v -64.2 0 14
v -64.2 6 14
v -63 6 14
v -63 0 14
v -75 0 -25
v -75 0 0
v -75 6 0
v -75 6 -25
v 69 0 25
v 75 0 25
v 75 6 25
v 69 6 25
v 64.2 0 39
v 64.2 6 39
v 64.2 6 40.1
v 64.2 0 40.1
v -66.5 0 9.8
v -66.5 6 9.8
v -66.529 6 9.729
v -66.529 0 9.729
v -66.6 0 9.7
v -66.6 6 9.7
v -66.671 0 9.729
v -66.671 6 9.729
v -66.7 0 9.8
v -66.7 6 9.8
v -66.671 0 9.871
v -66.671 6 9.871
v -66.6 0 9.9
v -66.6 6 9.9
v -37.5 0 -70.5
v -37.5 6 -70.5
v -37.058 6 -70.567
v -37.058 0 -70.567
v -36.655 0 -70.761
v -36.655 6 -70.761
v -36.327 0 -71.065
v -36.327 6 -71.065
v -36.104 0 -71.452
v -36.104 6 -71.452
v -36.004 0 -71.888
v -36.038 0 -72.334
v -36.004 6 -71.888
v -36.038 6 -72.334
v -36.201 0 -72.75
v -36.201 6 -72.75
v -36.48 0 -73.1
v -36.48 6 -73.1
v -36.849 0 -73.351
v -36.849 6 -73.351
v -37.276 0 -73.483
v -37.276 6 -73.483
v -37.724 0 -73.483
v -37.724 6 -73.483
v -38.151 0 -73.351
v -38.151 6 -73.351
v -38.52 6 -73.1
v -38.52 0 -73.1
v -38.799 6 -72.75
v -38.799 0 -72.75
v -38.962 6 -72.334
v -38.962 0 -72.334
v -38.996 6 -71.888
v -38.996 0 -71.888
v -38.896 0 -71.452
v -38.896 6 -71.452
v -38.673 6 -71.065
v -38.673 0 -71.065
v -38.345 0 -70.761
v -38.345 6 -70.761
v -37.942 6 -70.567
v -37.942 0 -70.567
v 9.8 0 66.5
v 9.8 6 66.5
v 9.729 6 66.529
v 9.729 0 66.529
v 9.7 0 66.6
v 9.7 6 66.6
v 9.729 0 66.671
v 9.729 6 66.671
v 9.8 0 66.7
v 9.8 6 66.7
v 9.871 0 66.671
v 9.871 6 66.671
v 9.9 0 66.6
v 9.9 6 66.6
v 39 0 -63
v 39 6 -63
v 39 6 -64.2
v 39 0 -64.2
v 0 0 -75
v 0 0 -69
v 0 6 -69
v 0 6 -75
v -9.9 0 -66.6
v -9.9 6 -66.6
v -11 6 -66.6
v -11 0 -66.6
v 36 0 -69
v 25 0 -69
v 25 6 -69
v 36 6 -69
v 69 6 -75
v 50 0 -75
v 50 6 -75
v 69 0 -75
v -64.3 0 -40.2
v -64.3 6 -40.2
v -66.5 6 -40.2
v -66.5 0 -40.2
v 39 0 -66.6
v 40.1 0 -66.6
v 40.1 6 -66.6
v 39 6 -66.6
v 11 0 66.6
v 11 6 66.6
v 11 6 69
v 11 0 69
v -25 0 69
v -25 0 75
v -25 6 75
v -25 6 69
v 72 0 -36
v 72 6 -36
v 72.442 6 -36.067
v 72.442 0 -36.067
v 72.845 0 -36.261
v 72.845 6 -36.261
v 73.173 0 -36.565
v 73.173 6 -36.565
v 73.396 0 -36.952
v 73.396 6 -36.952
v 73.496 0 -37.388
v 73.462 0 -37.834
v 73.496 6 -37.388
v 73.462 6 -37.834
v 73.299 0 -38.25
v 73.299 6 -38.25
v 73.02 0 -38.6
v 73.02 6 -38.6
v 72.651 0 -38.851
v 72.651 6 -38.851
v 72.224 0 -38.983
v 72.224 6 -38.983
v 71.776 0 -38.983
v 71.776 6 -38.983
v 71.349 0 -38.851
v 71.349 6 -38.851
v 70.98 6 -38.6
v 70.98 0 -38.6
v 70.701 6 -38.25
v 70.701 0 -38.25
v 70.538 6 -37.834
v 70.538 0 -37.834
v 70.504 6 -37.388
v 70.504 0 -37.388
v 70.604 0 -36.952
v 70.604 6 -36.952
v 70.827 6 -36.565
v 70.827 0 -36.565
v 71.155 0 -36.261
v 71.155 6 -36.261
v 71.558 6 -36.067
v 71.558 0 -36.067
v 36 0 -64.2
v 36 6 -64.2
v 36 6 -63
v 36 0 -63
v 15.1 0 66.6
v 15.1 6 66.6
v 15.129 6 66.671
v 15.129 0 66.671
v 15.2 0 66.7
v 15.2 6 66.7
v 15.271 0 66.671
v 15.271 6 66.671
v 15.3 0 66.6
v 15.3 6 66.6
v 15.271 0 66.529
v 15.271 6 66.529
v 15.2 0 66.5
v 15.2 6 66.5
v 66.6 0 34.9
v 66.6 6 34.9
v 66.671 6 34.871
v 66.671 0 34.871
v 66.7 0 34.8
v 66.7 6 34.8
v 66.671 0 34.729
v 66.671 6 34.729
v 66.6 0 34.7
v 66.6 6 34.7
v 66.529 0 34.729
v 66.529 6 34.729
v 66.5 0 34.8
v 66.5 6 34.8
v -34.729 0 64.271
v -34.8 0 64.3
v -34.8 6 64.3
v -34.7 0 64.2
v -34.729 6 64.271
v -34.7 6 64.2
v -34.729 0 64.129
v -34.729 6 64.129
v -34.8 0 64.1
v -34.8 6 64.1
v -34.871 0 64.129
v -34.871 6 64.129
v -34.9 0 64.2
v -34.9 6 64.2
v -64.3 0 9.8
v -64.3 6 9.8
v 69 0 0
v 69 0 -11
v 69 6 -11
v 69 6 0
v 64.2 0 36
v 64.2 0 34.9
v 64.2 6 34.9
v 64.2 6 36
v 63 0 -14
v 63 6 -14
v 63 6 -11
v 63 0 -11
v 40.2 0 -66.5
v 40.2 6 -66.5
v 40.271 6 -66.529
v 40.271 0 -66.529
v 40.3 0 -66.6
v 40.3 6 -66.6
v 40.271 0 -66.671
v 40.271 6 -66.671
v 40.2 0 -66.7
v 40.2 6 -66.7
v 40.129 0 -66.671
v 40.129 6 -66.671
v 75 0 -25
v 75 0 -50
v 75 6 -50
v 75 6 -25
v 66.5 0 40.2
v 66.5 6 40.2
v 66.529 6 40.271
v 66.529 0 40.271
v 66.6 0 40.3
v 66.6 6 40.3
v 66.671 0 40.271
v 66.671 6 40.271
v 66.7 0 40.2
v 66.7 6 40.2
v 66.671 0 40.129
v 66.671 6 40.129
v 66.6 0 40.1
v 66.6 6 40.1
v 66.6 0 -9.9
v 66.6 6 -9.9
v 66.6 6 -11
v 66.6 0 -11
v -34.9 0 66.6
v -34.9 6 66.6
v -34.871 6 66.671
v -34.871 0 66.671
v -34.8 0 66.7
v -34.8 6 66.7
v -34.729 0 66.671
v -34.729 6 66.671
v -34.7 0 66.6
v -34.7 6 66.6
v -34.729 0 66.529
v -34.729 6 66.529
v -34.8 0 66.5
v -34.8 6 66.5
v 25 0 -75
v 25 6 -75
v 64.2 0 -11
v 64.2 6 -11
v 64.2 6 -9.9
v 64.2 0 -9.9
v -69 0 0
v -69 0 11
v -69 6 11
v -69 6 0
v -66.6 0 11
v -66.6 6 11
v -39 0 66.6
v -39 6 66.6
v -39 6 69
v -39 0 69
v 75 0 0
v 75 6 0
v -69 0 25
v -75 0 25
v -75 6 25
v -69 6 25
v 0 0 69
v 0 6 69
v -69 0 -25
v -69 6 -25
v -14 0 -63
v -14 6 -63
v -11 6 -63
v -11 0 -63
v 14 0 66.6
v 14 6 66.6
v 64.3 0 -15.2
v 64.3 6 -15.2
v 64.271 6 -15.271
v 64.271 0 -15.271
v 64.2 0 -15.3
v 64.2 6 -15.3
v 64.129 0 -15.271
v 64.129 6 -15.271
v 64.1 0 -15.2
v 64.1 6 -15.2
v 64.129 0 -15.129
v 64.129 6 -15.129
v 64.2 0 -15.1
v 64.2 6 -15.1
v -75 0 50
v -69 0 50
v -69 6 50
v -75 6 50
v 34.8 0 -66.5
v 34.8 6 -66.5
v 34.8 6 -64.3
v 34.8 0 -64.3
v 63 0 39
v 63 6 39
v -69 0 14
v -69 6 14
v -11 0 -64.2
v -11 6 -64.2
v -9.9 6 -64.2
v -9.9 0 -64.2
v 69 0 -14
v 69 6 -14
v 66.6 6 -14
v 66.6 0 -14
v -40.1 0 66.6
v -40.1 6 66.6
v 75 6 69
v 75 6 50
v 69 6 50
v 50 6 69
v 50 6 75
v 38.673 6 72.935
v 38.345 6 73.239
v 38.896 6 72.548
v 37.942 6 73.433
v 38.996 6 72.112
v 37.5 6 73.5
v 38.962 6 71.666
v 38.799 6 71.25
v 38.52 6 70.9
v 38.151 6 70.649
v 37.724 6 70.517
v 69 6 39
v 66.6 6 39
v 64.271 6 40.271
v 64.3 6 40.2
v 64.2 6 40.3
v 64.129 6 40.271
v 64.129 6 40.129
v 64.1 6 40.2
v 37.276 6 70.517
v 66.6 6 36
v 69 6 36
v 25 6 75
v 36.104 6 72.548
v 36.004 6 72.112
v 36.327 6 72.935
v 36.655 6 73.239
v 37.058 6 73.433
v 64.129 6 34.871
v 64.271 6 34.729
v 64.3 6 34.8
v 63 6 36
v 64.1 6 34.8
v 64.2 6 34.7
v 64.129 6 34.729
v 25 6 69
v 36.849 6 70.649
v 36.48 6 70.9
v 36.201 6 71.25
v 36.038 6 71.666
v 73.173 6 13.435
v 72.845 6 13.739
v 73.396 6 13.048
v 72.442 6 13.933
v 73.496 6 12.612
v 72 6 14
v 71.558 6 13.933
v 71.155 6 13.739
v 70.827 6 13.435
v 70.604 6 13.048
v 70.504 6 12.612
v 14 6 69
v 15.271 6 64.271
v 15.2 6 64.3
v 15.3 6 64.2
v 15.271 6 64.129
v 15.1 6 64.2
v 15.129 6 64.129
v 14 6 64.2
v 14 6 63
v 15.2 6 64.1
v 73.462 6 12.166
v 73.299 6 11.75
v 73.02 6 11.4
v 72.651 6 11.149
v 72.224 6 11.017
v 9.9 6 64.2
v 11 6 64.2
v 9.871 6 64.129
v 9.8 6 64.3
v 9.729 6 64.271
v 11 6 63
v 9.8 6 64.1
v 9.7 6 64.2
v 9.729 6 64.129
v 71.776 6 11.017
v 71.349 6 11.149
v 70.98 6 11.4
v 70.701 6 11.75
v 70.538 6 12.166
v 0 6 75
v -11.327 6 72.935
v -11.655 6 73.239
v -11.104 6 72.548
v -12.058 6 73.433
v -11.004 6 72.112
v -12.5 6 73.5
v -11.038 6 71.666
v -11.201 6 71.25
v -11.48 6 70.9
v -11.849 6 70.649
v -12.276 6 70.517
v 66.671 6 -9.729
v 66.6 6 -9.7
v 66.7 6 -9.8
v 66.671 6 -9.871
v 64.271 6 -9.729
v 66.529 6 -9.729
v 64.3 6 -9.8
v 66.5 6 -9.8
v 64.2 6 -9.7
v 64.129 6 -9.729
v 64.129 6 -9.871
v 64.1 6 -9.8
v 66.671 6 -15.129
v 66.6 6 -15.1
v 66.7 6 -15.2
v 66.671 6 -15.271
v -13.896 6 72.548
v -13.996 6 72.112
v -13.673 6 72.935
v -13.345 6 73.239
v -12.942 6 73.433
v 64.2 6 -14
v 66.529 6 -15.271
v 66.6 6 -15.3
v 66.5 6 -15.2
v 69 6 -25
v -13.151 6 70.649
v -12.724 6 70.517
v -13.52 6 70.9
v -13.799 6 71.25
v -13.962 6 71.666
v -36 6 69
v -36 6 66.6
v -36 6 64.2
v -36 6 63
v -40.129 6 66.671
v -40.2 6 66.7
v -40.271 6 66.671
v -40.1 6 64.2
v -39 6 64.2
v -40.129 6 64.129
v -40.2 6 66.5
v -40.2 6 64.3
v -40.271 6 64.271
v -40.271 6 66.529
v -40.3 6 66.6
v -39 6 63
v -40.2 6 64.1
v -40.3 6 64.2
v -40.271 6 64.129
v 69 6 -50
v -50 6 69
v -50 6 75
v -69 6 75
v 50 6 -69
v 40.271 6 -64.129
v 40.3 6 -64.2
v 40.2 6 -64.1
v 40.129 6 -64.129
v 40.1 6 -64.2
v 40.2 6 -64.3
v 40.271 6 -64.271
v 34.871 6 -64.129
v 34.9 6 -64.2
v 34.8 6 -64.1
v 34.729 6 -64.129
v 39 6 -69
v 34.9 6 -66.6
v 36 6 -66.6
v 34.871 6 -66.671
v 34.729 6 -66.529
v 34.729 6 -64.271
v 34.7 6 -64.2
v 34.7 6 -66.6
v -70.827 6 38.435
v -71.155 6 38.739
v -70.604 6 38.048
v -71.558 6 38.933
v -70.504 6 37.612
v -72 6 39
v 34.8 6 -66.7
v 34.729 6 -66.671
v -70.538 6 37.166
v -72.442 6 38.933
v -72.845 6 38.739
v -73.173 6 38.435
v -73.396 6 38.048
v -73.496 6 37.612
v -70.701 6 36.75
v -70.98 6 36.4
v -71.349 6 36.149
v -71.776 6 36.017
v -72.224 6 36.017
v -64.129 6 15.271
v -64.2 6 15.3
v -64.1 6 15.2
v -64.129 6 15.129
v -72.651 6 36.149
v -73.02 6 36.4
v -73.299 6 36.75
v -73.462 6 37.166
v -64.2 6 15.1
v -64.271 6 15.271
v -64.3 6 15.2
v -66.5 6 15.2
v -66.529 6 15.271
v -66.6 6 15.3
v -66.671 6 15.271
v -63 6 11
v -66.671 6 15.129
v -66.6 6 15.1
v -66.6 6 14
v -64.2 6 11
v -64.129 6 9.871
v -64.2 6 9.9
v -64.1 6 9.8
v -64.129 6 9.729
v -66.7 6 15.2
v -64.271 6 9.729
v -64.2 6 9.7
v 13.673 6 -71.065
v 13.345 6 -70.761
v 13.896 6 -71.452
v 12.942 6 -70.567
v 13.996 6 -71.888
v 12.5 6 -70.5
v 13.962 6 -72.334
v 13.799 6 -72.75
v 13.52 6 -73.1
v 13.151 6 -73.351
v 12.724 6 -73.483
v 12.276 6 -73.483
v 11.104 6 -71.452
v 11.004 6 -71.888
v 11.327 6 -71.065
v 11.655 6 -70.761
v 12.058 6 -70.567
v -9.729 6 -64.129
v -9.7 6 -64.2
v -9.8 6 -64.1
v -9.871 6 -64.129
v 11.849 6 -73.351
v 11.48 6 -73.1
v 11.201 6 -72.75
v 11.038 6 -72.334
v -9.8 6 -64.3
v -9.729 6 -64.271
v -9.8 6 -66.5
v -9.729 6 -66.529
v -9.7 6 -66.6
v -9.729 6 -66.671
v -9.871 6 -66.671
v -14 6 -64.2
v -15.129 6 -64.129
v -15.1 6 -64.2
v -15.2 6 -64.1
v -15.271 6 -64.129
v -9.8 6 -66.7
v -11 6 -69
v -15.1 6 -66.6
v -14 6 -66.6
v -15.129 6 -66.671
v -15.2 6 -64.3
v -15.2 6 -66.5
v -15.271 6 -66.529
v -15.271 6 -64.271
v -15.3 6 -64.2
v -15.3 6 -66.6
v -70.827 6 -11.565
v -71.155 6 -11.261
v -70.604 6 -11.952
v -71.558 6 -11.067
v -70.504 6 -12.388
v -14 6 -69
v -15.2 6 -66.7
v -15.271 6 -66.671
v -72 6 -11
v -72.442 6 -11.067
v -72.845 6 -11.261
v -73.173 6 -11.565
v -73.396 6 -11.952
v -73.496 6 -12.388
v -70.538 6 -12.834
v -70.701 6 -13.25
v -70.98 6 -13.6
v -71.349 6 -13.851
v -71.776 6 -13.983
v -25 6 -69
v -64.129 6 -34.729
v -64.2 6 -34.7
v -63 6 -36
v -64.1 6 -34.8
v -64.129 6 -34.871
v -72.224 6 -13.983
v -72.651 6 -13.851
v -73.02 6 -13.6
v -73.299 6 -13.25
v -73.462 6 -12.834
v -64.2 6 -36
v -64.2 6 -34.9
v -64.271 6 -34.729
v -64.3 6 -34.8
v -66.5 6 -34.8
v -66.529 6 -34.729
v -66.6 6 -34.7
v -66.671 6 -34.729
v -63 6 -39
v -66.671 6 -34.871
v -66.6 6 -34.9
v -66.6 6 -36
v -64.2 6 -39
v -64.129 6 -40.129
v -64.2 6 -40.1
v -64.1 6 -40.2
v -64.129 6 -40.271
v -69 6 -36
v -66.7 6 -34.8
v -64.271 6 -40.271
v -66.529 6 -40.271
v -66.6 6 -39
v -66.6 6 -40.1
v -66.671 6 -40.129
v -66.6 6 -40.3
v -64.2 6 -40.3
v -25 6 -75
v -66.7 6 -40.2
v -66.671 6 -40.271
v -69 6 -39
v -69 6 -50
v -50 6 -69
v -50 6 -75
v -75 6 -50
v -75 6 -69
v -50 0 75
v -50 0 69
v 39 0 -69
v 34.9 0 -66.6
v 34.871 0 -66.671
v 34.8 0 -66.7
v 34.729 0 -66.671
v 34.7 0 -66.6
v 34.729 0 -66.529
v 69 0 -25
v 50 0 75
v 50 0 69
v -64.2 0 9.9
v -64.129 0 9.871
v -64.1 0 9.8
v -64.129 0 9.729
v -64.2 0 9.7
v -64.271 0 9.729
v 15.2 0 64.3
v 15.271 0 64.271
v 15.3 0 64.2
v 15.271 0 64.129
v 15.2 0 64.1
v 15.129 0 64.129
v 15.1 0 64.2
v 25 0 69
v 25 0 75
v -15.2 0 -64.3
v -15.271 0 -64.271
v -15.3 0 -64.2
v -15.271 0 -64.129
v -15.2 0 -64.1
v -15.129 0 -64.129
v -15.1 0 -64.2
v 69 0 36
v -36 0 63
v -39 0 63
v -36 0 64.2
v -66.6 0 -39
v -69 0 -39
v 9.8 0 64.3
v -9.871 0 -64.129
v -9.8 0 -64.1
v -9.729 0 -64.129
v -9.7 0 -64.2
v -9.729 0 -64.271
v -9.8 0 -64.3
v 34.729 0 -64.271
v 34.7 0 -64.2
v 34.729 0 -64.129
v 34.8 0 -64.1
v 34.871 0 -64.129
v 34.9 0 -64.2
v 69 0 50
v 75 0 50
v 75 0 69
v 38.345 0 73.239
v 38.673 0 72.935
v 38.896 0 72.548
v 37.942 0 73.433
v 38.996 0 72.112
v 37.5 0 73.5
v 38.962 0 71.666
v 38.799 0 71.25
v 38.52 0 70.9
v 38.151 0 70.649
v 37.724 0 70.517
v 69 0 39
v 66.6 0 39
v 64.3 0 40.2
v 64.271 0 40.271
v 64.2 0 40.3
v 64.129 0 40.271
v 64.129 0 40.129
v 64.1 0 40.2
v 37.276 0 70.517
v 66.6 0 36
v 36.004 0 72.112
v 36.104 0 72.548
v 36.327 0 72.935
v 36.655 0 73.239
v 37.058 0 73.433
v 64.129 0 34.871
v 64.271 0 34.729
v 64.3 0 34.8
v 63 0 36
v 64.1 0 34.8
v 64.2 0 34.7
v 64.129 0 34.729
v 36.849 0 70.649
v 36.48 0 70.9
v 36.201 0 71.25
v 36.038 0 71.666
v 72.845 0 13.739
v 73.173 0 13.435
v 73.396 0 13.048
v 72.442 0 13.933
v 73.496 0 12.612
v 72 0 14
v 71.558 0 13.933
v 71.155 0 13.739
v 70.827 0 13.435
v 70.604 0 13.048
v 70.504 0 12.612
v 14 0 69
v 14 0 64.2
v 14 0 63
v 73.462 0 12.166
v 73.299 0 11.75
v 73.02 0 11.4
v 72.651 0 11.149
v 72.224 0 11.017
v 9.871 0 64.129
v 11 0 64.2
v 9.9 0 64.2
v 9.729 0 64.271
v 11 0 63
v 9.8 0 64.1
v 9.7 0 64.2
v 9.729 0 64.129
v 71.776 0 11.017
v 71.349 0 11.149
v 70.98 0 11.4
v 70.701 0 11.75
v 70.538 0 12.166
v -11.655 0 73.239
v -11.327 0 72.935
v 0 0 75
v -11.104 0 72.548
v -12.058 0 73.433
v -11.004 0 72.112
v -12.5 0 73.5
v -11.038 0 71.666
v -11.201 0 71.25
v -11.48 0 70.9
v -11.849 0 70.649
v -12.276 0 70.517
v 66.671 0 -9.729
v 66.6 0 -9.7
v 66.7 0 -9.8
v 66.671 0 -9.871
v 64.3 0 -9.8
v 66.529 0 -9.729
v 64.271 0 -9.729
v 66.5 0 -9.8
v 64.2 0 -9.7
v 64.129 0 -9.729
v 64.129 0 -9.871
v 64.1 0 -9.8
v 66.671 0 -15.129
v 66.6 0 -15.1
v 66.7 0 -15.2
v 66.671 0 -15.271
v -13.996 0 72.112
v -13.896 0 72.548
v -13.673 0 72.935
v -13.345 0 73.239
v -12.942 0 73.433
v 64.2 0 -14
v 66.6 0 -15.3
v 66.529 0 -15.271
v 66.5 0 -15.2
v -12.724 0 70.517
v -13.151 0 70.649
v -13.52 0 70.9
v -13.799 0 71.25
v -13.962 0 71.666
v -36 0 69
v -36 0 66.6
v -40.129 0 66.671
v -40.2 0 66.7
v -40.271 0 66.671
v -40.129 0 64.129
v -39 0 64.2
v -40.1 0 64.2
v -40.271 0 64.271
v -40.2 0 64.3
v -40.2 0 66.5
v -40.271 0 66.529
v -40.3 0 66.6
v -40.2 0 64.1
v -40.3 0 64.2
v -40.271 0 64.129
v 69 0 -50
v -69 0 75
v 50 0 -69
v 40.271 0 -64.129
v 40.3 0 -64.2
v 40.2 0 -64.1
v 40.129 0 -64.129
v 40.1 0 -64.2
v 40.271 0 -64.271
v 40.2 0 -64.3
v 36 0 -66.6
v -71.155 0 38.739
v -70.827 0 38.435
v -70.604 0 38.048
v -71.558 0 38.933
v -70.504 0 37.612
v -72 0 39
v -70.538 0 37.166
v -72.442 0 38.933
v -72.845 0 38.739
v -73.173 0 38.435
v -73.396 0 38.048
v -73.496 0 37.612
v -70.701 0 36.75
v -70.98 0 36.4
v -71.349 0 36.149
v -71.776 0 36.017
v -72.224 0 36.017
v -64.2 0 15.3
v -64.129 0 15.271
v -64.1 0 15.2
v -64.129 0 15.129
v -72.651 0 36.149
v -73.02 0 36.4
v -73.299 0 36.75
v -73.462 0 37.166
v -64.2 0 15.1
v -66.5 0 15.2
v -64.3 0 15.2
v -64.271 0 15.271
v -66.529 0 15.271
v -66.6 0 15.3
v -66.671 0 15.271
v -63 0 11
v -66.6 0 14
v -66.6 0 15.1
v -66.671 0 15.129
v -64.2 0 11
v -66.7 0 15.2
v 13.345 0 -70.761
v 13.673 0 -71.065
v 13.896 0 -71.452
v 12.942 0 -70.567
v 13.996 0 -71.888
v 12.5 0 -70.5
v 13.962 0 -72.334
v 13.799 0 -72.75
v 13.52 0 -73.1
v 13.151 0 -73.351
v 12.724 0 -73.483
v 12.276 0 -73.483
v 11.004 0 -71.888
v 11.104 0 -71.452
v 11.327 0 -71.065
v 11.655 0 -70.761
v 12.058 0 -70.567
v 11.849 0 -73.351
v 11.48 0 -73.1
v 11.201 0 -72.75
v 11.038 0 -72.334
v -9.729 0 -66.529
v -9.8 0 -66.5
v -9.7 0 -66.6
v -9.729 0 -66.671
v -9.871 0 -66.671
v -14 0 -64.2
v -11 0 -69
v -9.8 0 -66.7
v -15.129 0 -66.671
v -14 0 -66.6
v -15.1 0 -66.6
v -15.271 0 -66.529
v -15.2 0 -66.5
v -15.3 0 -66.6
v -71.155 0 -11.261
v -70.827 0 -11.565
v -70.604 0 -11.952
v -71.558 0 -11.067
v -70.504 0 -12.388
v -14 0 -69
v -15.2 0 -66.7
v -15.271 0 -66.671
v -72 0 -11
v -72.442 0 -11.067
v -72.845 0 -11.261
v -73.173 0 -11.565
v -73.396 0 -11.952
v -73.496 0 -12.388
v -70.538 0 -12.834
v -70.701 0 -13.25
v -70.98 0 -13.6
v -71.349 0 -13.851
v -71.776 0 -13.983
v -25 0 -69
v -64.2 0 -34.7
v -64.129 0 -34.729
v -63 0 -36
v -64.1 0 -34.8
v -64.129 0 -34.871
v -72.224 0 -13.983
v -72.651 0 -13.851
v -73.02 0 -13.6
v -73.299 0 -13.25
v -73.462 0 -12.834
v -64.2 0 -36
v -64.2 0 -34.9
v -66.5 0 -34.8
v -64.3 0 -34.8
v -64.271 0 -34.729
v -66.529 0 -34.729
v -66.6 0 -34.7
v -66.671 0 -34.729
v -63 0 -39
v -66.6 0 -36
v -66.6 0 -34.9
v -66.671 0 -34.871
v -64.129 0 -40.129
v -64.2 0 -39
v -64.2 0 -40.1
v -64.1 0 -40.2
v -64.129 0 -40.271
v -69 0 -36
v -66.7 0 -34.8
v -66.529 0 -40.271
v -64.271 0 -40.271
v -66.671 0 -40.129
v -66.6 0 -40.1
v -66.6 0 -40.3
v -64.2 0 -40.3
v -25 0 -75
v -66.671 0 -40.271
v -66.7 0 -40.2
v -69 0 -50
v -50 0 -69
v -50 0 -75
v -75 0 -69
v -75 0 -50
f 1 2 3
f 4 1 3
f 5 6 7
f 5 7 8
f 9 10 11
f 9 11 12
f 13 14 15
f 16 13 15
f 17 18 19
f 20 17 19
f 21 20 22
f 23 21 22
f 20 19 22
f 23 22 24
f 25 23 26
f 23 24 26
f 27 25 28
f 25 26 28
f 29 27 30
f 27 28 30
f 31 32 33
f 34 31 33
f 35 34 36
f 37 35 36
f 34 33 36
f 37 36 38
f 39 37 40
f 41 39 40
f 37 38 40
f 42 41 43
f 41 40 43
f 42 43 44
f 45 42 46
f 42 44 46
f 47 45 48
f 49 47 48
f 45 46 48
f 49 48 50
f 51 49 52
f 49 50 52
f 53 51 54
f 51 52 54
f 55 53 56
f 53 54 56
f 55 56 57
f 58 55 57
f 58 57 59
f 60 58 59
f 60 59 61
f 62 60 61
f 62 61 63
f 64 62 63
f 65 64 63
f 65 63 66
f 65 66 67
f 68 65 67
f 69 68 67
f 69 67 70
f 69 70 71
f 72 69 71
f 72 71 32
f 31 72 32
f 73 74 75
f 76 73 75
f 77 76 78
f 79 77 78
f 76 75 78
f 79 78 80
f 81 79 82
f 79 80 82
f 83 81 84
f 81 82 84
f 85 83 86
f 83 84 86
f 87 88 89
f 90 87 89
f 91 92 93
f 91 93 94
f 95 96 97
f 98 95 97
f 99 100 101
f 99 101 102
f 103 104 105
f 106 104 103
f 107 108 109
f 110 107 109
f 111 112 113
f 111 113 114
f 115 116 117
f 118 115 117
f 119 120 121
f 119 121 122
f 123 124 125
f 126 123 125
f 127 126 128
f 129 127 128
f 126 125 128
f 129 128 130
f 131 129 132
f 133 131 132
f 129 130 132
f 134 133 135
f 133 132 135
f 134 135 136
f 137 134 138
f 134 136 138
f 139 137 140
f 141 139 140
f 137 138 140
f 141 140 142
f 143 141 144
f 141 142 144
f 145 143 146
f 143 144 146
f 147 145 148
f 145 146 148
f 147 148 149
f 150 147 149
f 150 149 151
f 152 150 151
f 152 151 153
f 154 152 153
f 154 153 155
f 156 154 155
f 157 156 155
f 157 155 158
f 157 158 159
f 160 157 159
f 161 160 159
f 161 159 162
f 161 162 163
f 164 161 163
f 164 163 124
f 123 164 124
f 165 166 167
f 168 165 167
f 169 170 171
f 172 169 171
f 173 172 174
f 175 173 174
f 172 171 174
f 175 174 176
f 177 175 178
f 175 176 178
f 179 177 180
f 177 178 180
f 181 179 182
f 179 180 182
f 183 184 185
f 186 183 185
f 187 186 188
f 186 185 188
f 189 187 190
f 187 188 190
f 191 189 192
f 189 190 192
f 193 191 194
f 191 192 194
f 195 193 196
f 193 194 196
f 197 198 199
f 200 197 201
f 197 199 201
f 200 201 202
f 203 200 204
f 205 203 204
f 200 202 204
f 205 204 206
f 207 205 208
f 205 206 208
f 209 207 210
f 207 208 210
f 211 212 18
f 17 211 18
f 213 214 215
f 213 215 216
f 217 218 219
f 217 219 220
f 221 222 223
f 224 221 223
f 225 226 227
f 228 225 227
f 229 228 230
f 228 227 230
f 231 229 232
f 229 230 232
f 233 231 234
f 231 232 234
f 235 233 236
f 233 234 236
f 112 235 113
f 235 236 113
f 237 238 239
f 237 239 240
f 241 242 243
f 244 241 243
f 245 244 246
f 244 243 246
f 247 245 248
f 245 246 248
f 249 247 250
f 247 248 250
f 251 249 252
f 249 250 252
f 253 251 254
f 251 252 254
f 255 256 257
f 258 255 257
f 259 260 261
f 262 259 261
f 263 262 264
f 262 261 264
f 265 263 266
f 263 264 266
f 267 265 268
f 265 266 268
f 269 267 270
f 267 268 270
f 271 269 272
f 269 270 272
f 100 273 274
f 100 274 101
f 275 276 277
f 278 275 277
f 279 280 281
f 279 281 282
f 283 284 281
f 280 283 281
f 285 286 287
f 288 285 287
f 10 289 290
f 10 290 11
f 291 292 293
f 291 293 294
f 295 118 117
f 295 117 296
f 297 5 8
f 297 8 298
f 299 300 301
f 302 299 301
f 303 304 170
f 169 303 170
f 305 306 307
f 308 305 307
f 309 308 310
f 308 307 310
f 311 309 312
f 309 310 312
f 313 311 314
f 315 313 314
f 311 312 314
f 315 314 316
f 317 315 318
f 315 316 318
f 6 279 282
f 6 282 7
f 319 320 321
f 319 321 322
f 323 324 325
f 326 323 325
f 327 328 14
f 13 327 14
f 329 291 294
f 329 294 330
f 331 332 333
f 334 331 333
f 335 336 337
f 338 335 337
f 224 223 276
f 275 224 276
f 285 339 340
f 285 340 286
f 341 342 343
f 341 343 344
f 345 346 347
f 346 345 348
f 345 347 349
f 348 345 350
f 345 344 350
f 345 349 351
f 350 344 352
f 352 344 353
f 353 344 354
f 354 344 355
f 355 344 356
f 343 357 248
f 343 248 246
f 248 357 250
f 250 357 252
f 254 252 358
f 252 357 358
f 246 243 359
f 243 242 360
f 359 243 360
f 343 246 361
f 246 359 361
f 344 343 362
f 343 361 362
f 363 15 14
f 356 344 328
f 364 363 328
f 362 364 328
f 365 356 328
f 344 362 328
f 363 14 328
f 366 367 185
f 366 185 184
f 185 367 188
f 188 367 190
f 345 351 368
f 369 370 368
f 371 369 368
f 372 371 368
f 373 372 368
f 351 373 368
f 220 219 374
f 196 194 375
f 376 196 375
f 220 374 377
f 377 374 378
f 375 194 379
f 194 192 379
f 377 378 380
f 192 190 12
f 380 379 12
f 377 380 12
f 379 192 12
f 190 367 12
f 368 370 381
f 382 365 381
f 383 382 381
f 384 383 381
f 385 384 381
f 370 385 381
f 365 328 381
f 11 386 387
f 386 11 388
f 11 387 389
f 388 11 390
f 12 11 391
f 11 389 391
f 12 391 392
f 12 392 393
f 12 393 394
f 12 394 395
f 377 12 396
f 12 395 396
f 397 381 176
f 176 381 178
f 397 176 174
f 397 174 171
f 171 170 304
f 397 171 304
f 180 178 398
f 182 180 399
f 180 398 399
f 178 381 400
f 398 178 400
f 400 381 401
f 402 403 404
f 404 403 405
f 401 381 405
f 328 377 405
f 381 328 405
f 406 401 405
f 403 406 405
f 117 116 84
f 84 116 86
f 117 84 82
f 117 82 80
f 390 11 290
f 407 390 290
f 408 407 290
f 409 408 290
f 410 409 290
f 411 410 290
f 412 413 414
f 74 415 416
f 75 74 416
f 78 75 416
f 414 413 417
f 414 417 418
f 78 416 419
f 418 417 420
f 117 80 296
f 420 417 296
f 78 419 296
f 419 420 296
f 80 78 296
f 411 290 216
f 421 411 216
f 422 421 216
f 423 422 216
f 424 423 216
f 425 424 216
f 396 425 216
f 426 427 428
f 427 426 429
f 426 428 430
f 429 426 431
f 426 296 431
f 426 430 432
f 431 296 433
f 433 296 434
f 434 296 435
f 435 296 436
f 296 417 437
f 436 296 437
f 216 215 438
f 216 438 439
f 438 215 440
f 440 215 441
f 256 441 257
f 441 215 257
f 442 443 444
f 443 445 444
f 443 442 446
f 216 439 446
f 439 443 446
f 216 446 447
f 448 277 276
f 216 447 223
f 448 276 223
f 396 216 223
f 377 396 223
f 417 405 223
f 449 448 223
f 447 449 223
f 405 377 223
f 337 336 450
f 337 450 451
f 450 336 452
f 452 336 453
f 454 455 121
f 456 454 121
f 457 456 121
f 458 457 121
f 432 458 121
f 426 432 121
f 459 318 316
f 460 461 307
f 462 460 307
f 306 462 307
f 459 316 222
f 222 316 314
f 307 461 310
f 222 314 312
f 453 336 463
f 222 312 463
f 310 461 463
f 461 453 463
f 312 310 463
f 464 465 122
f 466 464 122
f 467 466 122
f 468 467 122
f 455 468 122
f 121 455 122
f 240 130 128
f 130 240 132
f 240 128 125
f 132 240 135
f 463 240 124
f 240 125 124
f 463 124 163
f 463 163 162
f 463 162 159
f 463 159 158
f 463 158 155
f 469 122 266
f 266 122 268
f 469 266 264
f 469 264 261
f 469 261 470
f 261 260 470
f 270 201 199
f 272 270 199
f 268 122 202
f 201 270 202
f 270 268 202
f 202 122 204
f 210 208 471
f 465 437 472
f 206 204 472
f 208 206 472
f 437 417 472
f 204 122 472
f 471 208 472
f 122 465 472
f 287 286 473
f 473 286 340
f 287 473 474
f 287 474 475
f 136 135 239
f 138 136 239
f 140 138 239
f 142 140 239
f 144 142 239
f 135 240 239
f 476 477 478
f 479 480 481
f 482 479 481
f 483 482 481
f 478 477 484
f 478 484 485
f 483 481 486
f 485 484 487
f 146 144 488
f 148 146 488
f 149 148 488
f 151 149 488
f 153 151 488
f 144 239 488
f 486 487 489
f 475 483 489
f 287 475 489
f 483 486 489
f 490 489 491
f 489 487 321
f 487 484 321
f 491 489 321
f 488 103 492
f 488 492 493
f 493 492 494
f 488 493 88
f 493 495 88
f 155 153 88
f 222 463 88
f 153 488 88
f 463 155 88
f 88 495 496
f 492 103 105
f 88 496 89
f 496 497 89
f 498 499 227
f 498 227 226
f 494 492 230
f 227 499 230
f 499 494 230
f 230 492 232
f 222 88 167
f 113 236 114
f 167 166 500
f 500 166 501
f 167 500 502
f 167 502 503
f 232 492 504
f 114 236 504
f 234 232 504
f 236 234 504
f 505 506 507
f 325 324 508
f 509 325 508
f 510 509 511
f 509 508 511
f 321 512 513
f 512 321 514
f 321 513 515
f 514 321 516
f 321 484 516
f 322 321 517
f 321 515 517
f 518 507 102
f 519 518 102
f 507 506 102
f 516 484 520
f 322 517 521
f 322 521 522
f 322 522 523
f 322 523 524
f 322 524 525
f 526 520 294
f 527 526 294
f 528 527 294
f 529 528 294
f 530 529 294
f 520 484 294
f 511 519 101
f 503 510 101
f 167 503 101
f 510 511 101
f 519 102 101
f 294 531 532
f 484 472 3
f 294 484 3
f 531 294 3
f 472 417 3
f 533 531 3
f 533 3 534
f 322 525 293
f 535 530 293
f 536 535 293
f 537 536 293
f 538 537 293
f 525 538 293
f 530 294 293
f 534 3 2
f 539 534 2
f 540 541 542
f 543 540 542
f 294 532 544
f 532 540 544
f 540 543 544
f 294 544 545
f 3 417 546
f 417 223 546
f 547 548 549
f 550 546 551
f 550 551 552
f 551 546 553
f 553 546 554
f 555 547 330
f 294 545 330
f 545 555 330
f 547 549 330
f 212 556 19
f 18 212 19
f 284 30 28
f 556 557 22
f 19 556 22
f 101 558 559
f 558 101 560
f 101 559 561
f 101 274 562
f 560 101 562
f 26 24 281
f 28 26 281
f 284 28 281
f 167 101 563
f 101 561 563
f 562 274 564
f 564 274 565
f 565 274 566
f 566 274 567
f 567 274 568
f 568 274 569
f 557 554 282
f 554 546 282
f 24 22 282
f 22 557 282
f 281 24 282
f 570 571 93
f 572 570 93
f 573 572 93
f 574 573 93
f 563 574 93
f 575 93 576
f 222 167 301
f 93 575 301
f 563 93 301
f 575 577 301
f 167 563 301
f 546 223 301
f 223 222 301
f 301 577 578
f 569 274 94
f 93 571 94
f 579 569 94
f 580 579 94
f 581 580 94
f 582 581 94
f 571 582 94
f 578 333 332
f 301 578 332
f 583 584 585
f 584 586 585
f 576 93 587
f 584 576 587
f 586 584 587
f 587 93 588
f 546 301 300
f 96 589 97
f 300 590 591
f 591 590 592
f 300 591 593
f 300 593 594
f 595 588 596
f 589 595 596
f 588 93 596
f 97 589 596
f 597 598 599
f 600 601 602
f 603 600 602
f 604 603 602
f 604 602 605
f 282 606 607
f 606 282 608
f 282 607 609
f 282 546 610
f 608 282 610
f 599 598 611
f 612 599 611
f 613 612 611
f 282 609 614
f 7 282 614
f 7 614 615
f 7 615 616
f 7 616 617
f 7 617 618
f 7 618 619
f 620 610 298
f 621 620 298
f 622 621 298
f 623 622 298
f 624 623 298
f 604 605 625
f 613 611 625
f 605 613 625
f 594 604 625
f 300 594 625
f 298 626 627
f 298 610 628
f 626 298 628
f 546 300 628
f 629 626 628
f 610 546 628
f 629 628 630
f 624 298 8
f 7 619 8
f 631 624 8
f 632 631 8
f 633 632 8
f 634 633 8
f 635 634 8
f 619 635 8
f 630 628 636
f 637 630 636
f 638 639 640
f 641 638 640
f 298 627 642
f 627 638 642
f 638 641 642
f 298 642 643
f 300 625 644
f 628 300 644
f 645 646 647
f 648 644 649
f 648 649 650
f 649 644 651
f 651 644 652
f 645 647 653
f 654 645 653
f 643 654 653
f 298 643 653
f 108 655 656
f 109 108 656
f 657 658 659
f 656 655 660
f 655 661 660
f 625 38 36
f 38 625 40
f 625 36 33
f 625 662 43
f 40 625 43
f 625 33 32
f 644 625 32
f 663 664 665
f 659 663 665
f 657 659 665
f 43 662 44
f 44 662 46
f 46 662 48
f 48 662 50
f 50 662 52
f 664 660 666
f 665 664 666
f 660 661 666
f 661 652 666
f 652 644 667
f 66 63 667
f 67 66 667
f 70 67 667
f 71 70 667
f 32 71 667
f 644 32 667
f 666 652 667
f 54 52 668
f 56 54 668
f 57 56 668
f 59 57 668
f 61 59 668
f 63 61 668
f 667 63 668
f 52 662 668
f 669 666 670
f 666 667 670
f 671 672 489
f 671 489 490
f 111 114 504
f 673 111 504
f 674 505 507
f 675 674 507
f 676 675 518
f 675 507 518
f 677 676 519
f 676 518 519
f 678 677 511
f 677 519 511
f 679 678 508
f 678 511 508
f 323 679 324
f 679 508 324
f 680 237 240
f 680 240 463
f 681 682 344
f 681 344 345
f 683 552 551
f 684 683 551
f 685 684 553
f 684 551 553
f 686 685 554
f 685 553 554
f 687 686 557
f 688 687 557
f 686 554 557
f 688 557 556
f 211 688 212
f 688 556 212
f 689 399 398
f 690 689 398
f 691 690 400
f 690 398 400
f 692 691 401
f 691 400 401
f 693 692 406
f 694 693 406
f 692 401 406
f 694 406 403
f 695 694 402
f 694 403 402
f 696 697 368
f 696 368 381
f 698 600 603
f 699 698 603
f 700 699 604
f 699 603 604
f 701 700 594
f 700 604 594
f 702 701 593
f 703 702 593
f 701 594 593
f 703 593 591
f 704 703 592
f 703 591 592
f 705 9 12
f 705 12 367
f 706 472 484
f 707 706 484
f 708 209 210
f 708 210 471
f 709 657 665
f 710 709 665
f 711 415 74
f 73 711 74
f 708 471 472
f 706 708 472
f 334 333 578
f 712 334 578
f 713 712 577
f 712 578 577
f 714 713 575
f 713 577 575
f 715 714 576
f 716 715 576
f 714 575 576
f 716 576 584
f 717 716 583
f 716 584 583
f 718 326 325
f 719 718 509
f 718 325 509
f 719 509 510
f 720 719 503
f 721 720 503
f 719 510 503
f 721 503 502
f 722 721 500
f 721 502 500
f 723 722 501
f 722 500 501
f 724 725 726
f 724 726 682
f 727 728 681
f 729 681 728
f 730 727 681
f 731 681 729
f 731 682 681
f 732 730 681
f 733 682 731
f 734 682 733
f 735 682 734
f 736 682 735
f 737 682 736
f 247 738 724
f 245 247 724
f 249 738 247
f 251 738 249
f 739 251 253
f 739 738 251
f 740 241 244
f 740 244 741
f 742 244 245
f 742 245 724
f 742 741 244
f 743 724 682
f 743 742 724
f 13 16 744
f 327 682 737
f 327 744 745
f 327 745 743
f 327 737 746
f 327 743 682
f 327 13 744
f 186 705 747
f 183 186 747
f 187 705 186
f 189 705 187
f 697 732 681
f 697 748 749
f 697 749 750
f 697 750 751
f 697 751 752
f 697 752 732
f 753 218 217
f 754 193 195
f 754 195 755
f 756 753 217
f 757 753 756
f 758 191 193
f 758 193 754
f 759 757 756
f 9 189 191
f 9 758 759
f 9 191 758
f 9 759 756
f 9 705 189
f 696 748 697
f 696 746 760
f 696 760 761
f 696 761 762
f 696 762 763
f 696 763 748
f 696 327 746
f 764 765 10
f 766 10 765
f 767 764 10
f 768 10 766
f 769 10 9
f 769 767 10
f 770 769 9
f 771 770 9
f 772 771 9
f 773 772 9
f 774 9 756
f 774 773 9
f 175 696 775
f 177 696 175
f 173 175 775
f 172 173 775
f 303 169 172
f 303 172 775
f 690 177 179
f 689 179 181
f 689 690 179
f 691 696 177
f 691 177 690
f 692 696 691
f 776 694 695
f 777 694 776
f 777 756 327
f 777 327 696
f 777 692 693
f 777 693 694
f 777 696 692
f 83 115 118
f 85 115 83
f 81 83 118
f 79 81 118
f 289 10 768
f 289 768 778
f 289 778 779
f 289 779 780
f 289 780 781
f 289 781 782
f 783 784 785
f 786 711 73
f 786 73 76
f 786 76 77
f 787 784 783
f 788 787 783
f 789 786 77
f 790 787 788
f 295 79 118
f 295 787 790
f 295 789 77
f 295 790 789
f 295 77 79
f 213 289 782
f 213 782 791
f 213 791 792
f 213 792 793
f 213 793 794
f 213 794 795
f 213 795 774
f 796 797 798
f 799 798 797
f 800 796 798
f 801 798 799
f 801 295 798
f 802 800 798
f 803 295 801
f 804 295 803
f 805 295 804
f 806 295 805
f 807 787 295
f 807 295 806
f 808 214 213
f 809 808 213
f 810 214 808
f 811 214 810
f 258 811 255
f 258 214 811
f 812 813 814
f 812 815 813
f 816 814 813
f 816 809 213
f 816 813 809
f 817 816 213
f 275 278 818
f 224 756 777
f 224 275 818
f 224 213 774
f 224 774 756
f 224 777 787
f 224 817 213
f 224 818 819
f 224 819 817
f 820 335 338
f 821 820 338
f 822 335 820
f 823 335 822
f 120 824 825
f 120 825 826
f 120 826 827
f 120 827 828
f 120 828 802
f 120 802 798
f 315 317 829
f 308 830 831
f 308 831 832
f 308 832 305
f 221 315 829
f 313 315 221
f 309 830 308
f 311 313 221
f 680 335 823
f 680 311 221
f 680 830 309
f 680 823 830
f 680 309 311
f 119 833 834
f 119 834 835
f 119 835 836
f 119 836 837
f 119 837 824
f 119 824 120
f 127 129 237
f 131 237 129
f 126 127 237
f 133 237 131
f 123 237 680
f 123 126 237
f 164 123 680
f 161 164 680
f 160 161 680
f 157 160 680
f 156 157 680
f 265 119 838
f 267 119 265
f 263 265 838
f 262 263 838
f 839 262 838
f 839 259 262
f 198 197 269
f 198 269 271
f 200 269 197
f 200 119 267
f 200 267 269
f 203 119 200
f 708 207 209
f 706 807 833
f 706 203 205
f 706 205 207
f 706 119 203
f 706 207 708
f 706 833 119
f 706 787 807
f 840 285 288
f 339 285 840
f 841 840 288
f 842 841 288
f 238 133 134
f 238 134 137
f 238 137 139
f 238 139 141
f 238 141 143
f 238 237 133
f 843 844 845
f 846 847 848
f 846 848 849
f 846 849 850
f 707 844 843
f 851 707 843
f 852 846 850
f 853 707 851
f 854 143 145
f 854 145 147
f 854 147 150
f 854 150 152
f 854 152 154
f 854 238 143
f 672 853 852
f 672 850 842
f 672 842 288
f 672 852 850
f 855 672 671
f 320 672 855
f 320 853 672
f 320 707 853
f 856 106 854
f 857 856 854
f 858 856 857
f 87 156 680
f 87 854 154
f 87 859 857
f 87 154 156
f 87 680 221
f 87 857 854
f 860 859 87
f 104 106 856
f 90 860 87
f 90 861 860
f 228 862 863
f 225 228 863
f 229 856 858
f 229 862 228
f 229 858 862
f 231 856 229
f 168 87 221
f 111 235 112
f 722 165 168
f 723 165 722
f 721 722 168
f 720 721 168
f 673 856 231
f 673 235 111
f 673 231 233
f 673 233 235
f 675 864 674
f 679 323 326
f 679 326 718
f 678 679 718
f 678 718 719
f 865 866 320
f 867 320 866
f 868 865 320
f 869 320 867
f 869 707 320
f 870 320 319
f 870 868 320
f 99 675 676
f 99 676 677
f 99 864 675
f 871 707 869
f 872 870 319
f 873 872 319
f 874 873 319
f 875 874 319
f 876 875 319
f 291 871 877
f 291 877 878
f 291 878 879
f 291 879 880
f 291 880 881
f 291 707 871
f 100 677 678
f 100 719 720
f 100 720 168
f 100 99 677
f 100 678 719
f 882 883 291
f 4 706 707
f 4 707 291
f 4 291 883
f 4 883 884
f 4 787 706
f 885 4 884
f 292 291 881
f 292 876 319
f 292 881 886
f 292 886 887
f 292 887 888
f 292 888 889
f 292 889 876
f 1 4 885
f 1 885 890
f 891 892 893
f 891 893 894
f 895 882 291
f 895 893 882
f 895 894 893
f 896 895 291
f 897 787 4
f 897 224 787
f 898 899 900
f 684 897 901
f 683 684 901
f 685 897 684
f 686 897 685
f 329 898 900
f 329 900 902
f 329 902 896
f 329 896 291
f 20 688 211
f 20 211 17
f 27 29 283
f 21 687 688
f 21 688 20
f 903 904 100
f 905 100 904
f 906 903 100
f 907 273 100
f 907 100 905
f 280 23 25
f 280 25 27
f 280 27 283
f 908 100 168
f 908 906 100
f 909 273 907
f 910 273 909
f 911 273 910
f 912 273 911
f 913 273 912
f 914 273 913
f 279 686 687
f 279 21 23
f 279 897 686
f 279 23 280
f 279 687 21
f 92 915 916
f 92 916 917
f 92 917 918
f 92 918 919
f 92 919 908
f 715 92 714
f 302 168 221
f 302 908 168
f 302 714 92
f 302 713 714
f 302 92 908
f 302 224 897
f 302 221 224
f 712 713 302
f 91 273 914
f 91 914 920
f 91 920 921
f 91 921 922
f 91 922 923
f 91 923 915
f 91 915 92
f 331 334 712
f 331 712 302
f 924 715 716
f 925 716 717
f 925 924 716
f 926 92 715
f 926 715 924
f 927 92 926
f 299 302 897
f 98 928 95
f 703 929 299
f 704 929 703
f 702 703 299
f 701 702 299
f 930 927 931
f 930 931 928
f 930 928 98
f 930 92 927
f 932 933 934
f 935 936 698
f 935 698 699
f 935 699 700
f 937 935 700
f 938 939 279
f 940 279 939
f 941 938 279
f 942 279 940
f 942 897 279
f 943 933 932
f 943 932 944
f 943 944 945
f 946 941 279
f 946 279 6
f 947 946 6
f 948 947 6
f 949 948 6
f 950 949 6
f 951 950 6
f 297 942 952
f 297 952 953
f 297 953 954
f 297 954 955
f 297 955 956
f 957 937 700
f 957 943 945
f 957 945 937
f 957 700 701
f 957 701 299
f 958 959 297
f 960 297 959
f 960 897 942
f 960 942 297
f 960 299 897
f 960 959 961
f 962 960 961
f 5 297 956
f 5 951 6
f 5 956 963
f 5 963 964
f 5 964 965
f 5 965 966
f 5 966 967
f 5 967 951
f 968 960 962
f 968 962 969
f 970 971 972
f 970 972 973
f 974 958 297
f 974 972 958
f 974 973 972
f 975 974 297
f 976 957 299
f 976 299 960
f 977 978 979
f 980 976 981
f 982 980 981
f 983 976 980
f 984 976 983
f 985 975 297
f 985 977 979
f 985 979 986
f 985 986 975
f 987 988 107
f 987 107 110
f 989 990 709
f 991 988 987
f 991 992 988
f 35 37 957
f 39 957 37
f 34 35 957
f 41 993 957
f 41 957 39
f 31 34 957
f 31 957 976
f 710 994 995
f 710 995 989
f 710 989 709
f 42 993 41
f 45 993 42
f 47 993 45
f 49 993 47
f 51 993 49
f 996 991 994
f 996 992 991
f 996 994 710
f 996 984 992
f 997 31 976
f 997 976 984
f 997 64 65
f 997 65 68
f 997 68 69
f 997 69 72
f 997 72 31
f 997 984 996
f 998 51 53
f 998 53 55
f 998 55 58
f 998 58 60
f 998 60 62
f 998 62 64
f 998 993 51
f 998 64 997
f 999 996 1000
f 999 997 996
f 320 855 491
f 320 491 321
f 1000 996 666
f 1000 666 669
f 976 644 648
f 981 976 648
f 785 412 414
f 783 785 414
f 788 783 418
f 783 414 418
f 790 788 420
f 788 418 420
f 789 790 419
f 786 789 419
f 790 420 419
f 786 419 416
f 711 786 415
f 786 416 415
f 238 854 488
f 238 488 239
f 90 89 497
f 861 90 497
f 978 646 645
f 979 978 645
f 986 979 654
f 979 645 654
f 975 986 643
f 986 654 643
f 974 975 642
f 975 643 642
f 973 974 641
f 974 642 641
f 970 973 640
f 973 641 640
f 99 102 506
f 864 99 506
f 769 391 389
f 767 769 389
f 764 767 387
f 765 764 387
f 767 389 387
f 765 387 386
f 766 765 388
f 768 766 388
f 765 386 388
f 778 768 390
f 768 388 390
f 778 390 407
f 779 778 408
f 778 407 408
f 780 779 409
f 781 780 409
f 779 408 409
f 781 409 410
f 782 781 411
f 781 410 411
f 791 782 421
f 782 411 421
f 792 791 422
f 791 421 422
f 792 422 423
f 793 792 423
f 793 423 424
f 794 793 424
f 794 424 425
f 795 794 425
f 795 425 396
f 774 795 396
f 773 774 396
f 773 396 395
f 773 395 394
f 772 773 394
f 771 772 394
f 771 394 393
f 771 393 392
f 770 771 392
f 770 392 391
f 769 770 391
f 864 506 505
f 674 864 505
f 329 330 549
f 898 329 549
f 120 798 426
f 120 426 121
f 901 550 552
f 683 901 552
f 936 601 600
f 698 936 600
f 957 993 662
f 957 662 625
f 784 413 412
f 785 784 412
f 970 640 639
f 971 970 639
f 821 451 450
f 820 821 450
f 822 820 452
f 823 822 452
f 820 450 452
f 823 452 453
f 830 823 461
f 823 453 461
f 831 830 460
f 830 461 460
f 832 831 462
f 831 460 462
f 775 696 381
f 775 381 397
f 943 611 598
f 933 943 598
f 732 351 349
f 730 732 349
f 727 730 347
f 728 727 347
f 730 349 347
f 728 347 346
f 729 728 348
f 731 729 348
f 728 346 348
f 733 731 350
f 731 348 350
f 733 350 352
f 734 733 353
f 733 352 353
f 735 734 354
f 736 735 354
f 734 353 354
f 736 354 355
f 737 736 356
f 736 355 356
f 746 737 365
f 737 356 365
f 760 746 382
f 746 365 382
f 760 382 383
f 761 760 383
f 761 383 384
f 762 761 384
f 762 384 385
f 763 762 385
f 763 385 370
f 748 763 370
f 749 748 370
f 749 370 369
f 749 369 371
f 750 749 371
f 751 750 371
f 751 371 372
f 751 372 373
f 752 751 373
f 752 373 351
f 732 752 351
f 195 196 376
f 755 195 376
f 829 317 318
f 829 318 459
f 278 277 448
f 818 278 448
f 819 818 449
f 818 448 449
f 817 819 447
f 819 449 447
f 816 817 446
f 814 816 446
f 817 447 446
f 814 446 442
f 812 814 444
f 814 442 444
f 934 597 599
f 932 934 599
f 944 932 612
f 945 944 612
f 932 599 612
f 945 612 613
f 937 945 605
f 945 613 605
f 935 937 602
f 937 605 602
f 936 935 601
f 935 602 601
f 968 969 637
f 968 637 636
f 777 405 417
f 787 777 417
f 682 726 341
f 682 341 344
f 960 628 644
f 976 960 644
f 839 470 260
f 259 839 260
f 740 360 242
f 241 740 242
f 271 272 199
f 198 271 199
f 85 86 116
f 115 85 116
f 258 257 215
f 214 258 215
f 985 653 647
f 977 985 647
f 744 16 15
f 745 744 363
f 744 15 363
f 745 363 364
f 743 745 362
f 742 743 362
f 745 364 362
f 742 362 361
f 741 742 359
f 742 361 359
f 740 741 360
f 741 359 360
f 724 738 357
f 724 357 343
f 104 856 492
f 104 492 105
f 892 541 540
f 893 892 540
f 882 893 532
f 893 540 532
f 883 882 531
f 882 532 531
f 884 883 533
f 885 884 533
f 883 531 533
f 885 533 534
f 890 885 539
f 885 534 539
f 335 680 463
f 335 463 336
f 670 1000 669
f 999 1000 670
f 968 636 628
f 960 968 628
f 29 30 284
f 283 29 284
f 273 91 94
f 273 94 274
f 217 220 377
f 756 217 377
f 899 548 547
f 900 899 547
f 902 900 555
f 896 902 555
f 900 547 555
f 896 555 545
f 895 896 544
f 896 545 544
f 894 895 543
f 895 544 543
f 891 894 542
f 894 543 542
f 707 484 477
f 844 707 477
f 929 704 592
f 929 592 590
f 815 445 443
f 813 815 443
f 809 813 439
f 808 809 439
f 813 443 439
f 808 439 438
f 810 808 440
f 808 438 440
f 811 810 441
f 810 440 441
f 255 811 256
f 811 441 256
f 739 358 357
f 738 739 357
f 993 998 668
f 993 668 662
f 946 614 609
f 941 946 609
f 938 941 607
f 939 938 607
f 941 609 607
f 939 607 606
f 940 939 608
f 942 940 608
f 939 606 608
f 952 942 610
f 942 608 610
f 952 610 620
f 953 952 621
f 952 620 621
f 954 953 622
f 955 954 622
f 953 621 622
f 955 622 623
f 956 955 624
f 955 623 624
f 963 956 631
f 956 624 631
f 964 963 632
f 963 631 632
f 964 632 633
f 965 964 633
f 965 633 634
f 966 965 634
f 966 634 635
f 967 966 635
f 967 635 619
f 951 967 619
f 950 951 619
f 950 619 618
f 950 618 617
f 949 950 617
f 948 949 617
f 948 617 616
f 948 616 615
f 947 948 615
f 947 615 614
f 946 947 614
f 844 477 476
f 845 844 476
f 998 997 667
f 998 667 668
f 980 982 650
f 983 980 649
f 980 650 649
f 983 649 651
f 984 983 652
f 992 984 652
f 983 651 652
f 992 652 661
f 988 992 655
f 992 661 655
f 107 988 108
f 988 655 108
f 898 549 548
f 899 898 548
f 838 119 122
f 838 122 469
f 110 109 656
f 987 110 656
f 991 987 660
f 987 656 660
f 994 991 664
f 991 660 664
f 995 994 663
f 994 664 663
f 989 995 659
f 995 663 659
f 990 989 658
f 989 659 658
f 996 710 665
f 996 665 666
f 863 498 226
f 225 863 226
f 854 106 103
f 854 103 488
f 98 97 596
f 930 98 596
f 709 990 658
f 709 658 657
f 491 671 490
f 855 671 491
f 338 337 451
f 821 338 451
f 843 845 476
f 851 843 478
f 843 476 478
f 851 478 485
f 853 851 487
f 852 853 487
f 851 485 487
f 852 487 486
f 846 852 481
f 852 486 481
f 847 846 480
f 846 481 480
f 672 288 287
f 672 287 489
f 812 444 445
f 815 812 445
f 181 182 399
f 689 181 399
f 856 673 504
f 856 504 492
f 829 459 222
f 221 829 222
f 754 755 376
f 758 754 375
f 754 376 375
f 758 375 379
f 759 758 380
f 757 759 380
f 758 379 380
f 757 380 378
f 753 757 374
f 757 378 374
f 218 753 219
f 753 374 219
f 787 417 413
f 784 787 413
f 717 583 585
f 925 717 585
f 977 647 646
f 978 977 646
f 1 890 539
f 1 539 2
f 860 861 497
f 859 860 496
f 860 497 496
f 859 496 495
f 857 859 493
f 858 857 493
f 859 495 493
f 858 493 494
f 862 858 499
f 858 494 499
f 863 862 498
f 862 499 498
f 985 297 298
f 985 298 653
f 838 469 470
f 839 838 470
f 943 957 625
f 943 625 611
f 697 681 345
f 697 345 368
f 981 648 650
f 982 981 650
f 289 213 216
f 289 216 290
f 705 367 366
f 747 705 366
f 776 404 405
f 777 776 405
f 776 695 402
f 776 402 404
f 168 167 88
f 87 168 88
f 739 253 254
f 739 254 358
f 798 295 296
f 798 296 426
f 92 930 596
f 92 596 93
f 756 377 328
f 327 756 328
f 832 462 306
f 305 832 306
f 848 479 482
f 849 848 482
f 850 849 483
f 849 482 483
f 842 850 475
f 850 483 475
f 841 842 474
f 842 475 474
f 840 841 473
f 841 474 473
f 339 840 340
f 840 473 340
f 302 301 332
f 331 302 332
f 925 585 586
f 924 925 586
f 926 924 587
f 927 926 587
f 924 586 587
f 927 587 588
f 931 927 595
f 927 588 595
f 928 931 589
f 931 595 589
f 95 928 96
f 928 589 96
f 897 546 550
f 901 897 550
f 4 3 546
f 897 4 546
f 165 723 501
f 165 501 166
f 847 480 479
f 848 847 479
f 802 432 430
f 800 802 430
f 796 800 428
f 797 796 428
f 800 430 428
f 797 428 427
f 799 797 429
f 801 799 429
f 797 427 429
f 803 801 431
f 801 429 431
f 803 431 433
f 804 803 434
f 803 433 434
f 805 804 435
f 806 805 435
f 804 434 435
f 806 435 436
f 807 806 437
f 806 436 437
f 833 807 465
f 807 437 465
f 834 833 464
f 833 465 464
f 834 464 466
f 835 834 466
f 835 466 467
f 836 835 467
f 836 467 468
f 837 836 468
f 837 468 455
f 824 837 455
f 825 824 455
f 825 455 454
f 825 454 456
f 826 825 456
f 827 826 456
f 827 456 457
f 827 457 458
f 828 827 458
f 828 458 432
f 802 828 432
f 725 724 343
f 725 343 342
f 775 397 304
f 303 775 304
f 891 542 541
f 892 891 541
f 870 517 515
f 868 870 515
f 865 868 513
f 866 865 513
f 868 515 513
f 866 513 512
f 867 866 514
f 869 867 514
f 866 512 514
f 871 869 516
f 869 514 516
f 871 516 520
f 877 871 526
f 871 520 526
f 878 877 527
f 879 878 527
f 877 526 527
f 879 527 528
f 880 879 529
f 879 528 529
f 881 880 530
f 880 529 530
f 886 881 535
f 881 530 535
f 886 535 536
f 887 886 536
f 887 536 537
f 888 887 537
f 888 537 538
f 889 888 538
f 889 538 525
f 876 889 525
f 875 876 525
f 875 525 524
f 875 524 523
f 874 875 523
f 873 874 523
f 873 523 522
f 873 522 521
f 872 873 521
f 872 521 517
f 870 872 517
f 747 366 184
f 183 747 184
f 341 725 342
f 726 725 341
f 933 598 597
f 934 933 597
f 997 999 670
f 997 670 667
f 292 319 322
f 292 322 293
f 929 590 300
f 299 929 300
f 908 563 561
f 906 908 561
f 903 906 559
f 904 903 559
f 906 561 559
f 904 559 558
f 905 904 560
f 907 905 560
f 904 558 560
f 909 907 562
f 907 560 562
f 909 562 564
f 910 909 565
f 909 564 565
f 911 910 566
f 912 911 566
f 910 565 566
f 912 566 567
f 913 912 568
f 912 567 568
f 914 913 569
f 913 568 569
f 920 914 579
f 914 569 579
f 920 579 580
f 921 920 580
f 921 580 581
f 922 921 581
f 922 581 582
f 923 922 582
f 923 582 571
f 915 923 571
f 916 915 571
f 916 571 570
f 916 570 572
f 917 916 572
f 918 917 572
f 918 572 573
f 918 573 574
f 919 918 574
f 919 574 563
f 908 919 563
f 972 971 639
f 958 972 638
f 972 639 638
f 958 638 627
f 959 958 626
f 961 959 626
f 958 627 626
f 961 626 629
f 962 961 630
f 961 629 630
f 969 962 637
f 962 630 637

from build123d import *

# Parameters (mm, degrees)
BOSS_EXTRUDE1_DEPTH = 6
SKETCH2_R           = 1.5
CUT_EXTRUDE1_DEPTH  = 107.235587258


with BuildPart() as part:
    # Sketch1 → Boss-Extrude1 (new body)
    with BuildSketch(Plane(origin=(0, 0, 0), x_dir=(1, 0, 0), z_dir=(0, 1, 0))):
        Polygon((0, 75), (25, 75), (25, 69), (50, 69), (50, 75), (69, 75), (69, 50), (75, 50), (75, 25), (69, 25), (69, 0), (75, 0), (75, -25), (69, -25), (69, -50), (75, -50), (75, -69), (50, -69), (50, -75), (25, -75), (25, -69), (0, -69), (0, -75), (-25, -75), (-25, -69), (-50, -69), (-50, -75), (-69, -75), (-69, -50), (-75, -50), (-75, -25), (-69, -25), (-69, 0), (-75, 0), (-75, 25), (-69, 25), (-69, 50), (-75, 50), (-75, 69), (-50, 69), (-50, 75), (-25, 75), (-25, 69), (0, 69), align=None)
    extrude(amount=BOSS_EXTRUDE1_DEPTH)

    # Sketch2 → Cut-Extrude1 (cut, through all)
    with BuildSketch(Plane(origin=(0, 6, 0), x_dir=(1, 0, 0), z_dir=(0, 1, 0))):
        with Locations(Location((-37.5, 72, 0), (0, 0, 270))):
            Circle(SKETCH2_R)
        with Locations(Location((12.5, 72, 0), (0, 0, 270))):
            Circle(SKETCH2_R)
        with Locations(Location((72, 37.5, 0), (0, 0, 270))):
            Circle(SKETCH2_R)
        with Locations(Location((72, -12.5, 0), (0, 0, 270))):
            Circle(SKETCH2_R)
        with Locations(Location((37.5, -72, 0), (0, 0, 270))):
            Circle(SKETCH2_R)
        with Locations(Location((-12.5, -72, 0), (0, 0, 270))):
            Circle(SKETCH2_R)
        with Locations(Location((-72, -37.5, 0), (0, 0, 270))):
            Circle(SKETCH2_R)
        with Locations(Location((-72, 12.5, 0), (0, 0, 270))):
            Circle(SKETCH2_R)
        with BuildLine():
            Line((-11, 69), (-14, 69))
            Line((-14, 69), (-14, 66.6))
            Line((-14, 66.6), (-15.1, 66.6))
            ThreePointArc((-15.1, 66.6), (-15.270710678, 66.670710678), (-15.2, 66.5))
            Line((-15.2, 66.5), (-15.2, 64.3))
            ThreePointArc((-15.2, 64.3), (-15.270710678, 64.129289322), (-15.1, 64.2))
            Line((-15.1, 64.2), (-14, 64.2))
            Line((-14, 64.2), (-14, 63))
            Line((-14, 63), (-11, 63))
            Line((-11, 63), (-11, 64.2))
            Line((-11, 64.2), (-9.9, 64.2))
            ThreePointArc((-9.9, 64.2), (-9.729289322, 64.129289322), (-9.8, 64.3))
            Line((-9.8, 64.3), (-9.8, 66.5))
            ThreePointArc((-9.8, 66.5), (-9.729289322, 66.670710678), (-9.9, 66.6))
            Line((-9.9, 66.6), (-11, 66.6))
            Line((-11, 66.6), (-11, 69))
        make_face()
        with BuildLine():
            Line((69, 11), (69, 14))
            Line((69, 14), (66.6, 14))
            Line((66.6, 14), (66.6, 15.1))
            ThreePointArc((66.6, 15.1), (66.670710678, 15.270710678), (66.5, 15.2))
            Line((66.5, 15.2), (64.3, 15.2))
            ThreePointArc((64.3, 15.2), (64.129289322, 15.270710678), (64.2, 15.1))
            Line((64.2, 15.1), (64.2, 14))
            Line((64.2, 14), (63, 14))
            Line((63, 14), (63, 11))
            Line((63, 11), (64.2, 11))
            Line((64.2, 11), (64.2, 9.9))
            ThreePointArc((64.2, 9.9), (64.129289322, 9.729289322), (64.3, 9.8))
            Line((64.3, 9.8), (66.5, 9.8))
            ThreePointArc((66.5, 9.8), (66.670710678, 9.729289322), (66.6, 9.9))
            Line((66.6, 9.9), (66.6, 11))
            Line((66.6, 11), (69, 11))
        make_face()
        with BuildLine():
            Line((39, 69), (36, 69))
            Line((36, 69), (36, 66.6))
            Line((36, 66.6), (34.9, 66.6))
            ThreePointArc((34.9, 66.6), (34.729289322, 66.670710678), (34.8, 66.5))
            Line((34.8, 66.5), (34.8, 64.3))
            ThreePointArc((34.8, 64.3), (34.729289322, 64.129289322), (34.9, 64.2))
            Line((34.9, 64.2), (36, 64.2))
            Line((36, 64.2), (36, 63))
            Line((36, 63), (39, 63))
            Line((39, 63), (39, 64.2))
            Line((39, 64.2), (40.1, 64.2))
            ThreePointArc((40.1, 64.2), (40.270710678, 64.129289322), (40.2, 64.3))
            Line((40.2, 64.3), (40.2, 66.5))
            ThreePointArc((40.2, 66.5), (40.270710678, 66.670710678), (40.1, 66.6))
            Line((40.1, 66.6), (39, 66.6))
            Line((39, 66.6), (39, 69))
        make_face()
        with BuildLine():
            Line((69, -39), (69, -36))
            Line((69, -36), (66.6, -36))
            Line((66.6, -36), (66.6, -34.9))
            ThreePointArc((66.6, -34.9), (66.670710678, -34.729289322), (66.5, -34.8))
            Line((66.5, -34.8), (64.3, -34.8))
            ThreePointArc((64.3, -34.8), (64.129289322, -34.729289322), (64.2, -34.9))
            Line((64.2, -34.9), (64.2, -36))
            Line((64.2, -36), (63, -36))
            Line((63, -36), (63, -39))
            Line((63, -39), (64.2, -39))
            Line((64.2, -39), (64.2, -40.1))
            ThreePointArc((64.2, -40.1), (64.129289322, -40.270710678), (64.3, -40.2))
            Line((64.3, -40.2), (66.5, -40.2))
            ThreePointArc((66.5, -40.2), (66.670710678, -40.270710678), (66.6, -40.1))
            Line((66.6, -40.1), (66.6, -39))
            Line((66.6, -39), (69, -39))
        make_face()
        with BuildLine():
            Line((11, -69), (14, -69))
            Line((14, -69), (14, -66.6))
            Line((14, -66.6), (15.1, -66.6))
            ThreePointArc((15.1, -66.6), (15.270710678, -66.670710678), (15.2, -66.5))
            Line((15.2, -66.5), (15.2, -64.3))
            ThreePointArc((15.2, -64.3), (15.270710678, -64.129289322), (15.1, -64.2))
            Line((15.1, -64.2), (14, -64.2))
            Line((14, -64.2), (14, -63))
            Line((14, -63), (11, -63))
            Line((11, -63), (11, -64.2))
            Line((11, -64.2), (9.9, -64.2))
            ThreePointArc((9.9, -64.2), (9.729289322, -64.129289322), (9.8, -64.3))
            Line((9.8, -64.3), (9.8, -66.5))
            ThreePointArc((9.8, -66.5), (9.729289322, -66.670710678), (9.9, -66.6))
            Line((9.9, -66.6), (11, -66.6))
            Line((11, -66.6), (11, -69))
        make_face()
        with BuildLine():
            Line((-39, -69), (-36, -69))
            Line((-36, -69), (-36, -66.6))
            Line((-36, -66.6), (-34.9, -66.6))
            ThreePointArc((-34.9, -66.6), (-34.729289322, -66.670710678), (-34.8, -66.5))
            Line((-34.8, -66.5), (-34.8, -64.3))
            ThreePointArc((-34.8, -64.3), (-34.729289322, -64.129289322), (-34.9, -64.2))
            Line((-34.9, -64.2), (-36, -64.2))
            Line((-36, -64.2), (-36, -63))
            Line((-36, -63), (-39, -63))
            Line((-39, -63), (-39, -64.2))
            Line((-39, -64.2), (-40.1, -64.2))
            ThreePointArc((-40.1, -64.2), (-40.270710678, -64.129289322), (-40.2, -64.3))
            Line((-40.2, -64.3), (-40.2, -66.5))
            ThreePointArc((-40.2, -66.5), (-40.270710678, -66.670710678), (-40.1, -66.6))
            Line((-40.1, -66.6), (-39, -66.6))
            Line((-39, -66.6), (-39, -69))
        make_face()
        with BuildLine():
            Line((-69, 39), (-69, 36))
            Line((-69, 36), (-66.6, 36))
            Line((-66.6, 36), (-66.6, 34.9))
            ThreePointArc((-66.6, 34.9), (-66.670710678, 34.729289322), (-66.5, 34.8))
            Line((-66.5, 34.8), (-64.3, 34.8))
            ThreePointArc((-64.3, 34.8), (-64.129289322, 34.729289322), (-64.2, 34.9))
            Line((-64.2, 34.9), (-64.2, 36))
            Line((-64.2, 36), (-63, 36))
            Line((-63, 36), (-63, 39))
            Line((-63, 39), (-64.2, 39))
            Line((-64.2, 39), (-64.2, 40.1))
            ThreePointArc((-64.2, 40.1), (-64.129289322, 40.270710678), (-64.3, 40.2))
            Line((-64.3, 40.2), (-66.5, 40.2))
            ThreePointArc((-66.5, 40.2), (-66.670710678, 40.270710678), (-66.6, 40.1))
            Line((-66.6, 40.1), (-66.6, 39))
            Line((-66.6, 39), (-69, 39))
        make_face()
        with BuildLine():
            Line((-69, -11), (-69, -14))
            Line((-69, -14), (-66.6, -14))
            Line((-66.6, -14), (-66.6, -15.1))
            ThreePointArc((-66.6, -15.1), (-66.670710678, -15.270710678), (-66.5, -15.2))
            Line((-66.5, -15.2), (-64.3, -15.2))
            ThreePointArc((-64.3, -15.2), (-64.129289322, -15.270710678), (-64.2, -15.1))
            Line((-64.2, -15.1), (-64.2, -14))
            Line((-64.2, -14), (-63, -14))
            Line((-63, -14), (-63, -11))
            Line((-63, -11), (-64.2, -11))
            Line((-64.2, -11), (-64.2, -9.9))
            ThreePointArc((-64.2, -9.9), (-64.129289322, -9.729289322), (-64.3, -9.8))
            Line((-64.3, -9.8), (-66.5, -9.8))
            ThreePointArc((-66.5, -9.8), (-66.670710678, -9.729289322), (-66.6, -9.9))
            Line((-66.6, -9.9), (-66.6, -11))
            Line((-66.6, -11), (-69, -11))
        make_face()
    extrude(amount=-CUT_EXTRUDE1_DEPTH, mode=Mode.SUBTRACT)


solid = part.part
